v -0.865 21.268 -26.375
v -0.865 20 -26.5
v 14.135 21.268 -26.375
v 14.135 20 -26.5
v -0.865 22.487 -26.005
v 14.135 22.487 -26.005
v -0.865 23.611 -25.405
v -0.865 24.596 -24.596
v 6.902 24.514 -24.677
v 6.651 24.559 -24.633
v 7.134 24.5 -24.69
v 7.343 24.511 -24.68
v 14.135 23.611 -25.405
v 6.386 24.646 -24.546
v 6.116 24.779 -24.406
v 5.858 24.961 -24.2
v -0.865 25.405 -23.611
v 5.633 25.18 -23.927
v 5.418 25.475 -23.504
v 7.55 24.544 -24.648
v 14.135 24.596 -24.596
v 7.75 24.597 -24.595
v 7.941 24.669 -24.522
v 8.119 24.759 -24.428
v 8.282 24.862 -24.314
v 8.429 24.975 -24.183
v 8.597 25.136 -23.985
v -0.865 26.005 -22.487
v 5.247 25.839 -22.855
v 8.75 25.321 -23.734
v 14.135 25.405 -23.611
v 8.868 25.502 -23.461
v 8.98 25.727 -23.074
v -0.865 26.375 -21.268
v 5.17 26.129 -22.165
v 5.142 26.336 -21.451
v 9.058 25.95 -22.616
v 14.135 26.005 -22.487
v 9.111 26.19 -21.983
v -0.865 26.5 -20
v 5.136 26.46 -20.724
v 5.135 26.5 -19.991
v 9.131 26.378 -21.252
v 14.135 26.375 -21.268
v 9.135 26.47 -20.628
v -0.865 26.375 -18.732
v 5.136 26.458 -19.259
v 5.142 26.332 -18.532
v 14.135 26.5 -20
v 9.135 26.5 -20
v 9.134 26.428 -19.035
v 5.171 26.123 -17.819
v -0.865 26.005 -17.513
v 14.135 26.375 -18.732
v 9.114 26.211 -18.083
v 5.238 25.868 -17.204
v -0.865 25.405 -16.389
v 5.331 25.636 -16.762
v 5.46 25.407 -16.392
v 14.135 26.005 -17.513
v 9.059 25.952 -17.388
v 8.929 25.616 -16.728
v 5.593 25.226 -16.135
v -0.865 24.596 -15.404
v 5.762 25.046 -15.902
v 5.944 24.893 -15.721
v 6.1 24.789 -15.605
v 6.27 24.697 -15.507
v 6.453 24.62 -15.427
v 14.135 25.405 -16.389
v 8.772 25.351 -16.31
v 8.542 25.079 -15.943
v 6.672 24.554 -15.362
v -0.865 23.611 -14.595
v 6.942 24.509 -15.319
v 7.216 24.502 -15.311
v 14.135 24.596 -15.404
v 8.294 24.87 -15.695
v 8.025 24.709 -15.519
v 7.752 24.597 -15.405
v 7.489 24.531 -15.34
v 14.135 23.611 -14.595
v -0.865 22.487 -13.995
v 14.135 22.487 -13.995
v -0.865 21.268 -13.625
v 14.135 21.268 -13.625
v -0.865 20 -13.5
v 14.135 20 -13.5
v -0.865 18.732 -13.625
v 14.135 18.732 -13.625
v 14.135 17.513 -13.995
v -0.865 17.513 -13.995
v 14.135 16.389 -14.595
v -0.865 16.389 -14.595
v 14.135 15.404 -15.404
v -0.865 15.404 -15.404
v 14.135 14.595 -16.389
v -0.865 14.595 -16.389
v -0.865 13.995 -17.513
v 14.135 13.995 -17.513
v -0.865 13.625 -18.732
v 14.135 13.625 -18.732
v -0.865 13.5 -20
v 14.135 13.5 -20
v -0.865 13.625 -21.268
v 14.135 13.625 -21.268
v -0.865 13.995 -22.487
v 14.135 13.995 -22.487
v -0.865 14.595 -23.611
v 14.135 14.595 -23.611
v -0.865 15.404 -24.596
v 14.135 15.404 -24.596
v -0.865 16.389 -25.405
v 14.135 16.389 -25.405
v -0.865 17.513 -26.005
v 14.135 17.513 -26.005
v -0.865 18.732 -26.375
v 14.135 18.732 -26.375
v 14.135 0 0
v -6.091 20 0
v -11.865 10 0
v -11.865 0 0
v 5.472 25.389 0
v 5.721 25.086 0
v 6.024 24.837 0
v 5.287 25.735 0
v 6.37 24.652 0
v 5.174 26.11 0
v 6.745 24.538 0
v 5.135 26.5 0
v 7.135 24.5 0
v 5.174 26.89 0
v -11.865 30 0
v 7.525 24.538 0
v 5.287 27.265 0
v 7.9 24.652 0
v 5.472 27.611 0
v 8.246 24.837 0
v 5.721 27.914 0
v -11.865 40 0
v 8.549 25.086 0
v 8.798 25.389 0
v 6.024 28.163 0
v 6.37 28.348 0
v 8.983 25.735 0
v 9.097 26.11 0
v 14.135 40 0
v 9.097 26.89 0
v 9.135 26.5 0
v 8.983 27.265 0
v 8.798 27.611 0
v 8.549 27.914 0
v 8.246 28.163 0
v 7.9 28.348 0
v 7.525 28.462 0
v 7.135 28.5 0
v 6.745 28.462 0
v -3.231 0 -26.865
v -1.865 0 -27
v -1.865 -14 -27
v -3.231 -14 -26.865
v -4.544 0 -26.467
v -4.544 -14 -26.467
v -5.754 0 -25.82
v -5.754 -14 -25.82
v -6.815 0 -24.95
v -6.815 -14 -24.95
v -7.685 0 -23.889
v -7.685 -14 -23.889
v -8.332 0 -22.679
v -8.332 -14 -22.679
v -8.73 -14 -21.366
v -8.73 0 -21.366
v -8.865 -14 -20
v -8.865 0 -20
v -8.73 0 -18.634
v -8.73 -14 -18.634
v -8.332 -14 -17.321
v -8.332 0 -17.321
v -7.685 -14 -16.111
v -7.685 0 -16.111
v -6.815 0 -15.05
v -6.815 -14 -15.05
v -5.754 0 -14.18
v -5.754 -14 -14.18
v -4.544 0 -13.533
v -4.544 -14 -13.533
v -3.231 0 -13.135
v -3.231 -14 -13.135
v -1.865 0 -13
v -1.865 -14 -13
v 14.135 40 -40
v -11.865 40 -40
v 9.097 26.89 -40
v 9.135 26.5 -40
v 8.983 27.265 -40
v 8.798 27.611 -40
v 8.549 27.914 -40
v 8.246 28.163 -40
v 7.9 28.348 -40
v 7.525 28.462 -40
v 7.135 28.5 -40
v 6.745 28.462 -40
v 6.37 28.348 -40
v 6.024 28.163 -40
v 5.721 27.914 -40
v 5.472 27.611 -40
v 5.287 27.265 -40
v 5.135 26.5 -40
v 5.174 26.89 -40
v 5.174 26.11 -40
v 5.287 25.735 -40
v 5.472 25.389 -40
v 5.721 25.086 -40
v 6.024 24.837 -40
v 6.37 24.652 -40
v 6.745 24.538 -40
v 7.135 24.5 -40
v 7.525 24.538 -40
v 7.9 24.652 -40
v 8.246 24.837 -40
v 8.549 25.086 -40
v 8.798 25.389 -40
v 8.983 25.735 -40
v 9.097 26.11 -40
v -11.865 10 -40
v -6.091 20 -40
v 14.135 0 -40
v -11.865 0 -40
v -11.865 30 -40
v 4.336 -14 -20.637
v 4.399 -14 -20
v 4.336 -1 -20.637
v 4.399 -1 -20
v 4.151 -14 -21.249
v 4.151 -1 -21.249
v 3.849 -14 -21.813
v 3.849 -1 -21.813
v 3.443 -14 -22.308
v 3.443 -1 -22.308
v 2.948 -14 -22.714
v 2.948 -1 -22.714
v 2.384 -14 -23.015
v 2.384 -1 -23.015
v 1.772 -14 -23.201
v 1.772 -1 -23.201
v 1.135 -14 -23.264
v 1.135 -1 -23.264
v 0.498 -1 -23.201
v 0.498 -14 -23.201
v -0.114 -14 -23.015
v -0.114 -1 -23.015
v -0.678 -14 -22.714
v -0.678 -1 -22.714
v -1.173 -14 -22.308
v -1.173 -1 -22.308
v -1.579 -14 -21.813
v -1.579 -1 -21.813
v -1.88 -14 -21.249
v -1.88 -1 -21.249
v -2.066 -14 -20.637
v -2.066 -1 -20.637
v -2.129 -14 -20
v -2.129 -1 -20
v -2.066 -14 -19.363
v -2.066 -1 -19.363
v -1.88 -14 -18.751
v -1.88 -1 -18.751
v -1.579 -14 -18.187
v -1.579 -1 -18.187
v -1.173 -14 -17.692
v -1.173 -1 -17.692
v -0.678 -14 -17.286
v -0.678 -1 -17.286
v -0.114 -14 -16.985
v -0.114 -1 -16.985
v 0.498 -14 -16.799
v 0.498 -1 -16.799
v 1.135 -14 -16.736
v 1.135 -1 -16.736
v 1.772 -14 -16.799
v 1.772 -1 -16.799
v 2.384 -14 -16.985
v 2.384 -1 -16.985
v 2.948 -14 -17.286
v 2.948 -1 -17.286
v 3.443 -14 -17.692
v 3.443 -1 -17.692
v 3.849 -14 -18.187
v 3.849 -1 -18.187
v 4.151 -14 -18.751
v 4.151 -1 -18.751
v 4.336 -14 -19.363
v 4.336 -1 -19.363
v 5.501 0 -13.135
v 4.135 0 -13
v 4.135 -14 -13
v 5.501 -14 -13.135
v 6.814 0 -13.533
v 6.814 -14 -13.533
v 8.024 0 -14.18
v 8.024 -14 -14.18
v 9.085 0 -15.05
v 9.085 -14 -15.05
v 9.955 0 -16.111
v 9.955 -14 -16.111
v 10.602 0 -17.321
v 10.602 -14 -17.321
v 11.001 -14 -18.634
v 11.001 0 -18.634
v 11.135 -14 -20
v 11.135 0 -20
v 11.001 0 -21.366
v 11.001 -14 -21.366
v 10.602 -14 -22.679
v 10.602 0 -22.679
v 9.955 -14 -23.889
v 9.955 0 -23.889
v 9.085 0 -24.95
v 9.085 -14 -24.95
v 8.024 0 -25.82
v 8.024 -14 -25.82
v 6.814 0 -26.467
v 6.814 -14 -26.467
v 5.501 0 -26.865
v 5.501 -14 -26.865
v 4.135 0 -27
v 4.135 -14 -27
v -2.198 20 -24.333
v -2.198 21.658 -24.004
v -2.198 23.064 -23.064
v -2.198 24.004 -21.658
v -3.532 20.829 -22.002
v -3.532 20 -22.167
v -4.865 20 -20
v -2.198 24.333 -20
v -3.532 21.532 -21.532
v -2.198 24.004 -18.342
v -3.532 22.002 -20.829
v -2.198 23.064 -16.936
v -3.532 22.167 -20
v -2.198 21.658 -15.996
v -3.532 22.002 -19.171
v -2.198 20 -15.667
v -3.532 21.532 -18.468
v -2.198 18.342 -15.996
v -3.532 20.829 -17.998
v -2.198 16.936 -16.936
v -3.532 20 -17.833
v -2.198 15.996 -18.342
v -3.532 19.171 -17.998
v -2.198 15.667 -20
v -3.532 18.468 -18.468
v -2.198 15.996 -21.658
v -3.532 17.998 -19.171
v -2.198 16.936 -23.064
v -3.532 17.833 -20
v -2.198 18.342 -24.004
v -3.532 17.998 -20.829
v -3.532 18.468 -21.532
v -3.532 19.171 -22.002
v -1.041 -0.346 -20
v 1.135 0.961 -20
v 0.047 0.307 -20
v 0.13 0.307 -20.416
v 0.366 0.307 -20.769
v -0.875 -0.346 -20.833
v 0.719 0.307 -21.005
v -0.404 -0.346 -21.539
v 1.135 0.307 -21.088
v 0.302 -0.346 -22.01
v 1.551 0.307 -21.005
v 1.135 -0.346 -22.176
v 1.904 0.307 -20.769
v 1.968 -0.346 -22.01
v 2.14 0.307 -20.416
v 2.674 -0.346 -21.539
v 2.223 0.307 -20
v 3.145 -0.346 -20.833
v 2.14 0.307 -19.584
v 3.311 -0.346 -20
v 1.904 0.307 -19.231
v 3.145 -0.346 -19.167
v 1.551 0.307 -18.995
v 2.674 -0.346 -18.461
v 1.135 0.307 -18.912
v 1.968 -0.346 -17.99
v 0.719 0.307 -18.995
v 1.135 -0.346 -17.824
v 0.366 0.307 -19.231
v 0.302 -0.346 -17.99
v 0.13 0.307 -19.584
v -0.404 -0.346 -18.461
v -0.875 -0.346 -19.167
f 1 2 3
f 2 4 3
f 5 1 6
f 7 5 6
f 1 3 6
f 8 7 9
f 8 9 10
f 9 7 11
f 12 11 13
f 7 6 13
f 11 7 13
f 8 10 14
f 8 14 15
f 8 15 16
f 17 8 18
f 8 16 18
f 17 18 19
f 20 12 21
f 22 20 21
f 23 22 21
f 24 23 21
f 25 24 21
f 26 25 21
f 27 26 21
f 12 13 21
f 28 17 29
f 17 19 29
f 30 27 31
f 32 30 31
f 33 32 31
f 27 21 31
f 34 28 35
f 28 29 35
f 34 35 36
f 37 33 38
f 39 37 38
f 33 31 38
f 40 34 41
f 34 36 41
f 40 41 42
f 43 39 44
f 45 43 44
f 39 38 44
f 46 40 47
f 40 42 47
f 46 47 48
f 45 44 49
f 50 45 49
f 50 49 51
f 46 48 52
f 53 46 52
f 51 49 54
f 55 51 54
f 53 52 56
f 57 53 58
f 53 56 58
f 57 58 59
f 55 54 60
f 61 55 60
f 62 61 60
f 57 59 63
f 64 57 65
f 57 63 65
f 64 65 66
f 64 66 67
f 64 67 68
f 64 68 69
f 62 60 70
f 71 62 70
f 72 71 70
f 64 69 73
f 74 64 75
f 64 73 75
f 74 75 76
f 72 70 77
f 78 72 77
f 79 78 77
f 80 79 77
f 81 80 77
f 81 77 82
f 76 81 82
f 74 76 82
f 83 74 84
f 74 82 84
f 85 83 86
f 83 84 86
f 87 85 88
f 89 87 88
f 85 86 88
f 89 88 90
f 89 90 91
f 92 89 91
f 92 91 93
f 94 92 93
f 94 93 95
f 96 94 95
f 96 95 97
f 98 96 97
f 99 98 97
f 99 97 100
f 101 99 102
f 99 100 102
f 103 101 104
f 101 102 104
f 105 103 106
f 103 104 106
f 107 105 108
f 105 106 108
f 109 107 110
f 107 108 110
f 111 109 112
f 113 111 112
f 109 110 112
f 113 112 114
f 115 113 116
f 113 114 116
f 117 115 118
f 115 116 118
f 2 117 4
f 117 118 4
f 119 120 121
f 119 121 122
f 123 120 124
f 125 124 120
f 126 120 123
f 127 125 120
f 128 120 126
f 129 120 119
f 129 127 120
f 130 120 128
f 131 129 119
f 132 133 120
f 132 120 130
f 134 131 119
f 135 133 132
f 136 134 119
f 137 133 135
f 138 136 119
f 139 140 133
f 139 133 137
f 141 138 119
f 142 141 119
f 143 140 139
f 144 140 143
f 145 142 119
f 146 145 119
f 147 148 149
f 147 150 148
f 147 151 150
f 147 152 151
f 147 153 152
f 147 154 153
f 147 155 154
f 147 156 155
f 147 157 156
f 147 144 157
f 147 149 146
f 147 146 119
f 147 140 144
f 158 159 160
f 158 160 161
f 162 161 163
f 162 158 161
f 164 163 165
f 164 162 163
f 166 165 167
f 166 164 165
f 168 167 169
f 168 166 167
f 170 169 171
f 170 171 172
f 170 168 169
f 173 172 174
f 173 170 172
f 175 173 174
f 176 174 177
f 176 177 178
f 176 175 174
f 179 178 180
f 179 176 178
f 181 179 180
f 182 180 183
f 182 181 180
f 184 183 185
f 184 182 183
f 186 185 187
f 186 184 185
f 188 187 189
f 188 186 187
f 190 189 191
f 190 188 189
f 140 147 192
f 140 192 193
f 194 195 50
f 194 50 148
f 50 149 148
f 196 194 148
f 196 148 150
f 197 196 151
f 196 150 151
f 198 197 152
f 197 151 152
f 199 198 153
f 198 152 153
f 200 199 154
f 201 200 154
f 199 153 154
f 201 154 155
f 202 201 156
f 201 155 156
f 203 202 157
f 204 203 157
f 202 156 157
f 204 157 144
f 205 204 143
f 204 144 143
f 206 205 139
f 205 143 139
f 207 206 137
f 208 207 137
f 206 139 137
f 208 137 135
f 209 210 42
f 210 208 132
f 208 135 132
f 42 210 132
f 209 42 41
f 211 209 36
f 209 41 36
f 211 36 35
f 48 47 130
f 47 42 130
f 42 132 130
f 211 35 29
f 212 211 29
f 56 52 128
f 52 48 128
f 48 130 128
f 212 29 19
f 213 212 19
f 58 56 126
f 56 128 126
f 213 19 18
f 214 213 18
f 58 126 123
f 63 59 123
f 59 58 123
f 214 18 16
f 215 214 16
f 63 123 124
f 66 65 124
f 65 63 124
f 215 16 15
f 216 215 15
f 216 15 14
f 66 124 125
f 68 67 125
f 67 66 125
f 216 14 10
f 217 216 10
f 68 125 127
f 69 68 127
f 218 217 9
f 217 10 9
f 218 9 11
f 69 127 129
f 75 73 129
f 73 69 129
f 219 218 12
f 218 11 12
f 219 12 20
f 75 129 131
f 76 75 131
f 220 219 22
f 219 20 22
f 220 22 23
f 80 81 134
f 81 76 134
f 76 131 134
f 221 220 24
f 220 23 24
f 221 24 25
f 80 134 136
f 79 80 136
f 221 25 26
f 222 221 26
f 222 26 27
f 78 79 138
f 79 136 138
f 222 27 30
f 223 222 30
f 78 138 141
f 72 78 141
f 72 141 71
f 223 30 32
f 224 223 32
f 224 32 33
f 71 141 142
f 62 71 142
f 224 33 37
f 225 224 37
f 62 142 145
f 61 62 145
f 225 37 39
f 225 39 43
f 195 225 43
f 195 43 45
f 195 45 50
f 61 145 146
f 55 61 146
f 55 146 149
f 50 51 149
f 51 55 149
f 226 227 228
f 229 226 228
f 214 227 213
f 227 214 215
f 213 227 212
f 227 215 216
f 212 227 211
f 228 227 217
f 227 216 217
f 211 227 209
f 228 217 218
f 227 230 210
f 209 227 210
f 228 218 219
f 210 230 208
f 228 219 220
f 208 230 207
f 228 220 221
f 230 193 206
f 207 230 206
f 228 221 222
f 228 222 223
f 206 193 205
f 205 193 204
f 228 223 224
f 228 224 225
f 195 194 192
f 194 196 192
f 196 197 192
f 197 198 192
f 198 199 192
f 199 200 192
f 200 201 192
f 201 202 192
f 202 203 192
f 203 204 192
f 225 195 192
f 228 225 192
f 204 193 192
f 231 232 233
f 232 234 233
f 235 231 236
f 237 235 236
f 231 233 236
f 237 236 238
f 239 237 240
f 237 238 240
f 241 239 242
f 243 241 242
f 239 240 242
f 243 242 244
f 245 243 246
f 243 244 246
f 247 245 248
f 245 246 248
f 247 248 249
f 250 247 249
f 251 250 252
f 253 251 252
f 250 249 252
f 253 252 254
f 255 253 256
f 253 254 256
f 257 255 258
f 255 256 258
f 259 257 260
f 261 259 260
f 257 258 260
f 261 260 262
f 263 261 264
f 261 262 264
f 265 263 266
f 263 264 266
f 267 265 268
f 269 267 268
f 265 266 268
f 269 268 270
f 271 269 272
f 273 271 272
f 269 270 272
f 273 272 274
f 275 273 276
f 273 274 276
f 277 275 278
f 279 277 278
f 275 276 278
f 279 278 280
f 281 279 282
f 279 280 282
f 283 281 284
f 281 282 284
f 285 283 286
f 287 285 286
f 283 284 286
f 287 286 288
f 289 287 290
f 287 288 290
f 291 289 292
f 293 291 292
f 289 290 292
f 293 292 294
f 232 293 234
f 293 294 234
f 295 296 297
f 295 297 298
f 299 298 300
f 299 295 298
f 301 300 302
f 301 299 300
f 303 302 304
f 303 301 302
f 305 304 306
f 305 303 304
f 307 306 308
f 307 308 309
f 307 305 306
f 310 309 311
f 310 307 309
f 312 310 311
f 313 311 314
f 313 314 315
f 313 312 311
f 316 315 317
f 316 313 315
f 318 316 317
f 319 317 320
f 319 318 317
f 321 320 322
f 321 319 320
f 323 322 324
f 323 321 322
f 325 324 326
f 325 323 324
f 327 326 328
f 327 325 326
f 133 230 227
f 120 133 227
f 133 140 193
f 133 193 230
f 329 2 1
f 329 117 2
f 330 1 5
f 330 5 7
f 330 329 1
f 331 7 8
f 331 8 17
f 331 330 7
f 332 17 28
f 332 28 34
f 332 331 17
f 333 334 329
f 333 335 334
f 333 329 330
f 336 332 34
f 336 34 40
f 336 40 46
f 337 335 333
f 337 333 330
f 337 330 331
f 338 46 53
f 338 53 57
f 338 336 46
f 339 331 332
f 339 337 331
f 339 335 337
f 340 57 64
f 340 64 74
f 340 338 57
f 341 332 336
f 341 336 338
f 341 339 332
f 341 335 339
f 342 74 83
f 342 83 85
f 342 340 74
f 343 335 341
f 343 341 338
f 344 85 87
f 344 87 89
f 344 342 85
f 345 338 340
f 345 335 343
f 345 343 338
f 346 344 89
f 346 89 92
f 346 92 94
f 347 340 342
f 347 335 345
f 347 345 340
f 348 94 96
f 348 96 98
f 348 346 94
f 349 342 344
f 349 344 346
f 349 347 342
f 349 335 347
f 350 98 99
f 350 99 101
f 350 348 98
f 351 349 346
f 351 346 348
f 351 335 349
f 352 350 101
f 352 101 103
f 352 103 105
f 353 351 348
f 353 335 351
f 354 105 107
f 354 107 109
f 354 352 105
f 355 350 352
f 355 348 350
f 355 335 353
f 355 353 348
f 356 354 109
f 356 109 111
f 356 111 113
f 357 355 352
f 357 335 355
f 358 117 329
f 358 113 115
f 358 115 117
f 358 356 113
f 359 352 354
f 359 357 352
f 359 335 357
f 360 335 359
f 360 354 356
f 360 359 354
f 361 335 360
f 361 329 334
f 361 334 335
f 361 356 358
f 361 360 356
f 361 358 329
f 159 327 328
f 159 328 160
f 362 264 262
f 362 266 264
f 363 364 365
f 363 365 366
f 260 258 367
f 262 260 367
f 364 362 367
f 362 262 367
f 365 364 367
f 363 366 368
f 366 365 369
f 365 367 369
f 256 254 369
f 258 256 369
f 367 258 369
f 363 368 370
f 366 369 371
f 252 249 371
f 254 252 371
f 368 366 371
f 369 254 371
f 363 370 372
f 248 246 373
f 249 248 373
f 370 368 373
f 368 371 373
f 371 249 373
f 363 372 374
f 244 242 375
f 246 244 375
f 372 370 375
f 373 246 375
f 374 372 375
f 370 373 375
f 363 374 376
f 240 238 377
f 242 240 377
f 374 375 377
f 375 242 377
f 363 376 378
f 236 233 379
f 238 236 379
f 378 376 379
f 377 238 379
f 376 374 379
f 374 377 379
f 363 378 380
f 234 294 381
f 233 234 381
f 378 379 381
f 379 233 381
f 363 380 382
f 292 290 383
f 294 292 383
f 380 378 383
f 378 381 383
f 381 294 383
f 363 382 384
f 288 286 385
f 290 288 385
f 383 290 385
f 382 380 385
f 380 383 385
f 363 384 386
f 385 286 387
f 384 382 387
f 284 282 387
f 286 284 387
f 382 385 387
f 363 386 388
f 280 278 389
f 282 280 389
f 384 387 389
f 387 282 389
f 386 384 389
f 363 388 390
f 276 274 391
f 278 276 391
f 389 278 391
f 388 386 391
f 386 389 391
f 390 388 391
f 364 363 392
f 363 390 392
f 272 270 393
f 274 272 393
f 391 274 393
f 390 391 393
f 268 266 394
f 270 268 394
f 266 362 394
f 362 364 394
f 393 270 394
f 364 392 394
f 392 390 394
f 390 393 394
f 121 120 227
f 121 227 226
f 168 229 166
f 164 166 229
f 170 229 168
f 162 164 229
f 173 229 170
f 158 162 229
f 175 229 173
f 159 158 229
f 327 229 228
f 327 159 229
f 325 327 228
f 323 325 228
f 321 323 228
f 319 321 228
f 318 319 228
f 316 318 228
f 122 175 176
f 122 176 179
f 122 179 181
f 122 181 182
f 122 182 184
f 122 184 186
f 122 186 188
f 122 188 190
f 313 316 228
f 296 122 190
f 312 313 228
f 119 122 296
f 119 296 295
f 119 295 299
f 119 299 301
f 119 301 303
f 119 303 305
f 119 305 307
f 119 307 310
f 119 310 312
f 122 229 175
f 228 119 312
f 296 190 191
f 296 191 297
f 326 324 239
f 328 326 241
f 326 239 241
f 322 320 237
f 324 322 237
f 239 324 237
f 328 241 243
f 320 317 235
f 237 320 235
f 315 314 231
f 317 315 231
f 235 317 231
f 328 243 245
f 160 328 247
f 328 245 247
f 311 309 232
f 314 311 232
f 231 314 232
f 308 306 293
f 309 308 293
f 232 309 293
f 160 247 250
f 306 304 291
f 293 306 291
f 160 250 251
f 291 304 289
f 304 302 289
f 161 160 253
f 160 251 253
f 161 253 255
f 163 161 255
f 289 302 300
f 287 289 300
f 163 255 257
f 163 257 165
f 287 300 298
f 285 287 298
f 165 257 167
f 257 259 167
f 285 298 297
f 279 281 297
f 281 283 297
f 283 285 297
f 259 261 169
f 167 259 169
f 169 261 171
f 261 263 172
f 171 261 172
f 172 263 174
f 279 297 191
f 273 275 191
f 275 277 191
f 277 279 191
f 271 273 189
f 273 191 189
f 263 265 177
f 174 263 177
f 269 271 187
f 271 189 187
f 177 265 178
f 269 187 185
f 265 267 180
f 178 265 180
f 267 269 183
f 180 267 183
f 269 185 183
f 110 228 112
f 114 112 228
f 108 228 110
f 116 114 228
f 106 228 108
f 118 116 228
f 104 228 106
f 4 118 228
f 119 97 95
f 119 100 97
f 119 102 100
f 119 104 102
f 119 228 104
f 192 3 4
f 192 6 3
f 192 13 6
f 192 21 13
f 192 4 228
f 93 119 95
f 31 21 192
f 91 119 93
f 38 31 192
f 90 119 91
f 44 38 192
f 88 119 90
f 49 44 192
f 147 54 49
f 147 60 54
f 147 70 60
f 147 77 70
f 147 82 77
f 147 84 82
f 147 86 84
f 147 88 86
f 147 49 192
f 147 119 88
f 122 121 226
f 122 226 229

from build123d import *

# Parameters (mm, degrees)
RESSALTO_EXTRUS_O1_DEPTH                       = 40
ESBO_O2_R                                      = 6.5
CORTE_EXTRUS_O1_DEPTH                          = 19
CHANFRO1_SIZE2                                 = 6.5
CHANFRO1_SIZE                                  = 4
ESBO_O3_R                                      = 2
CORTE_EXTRUS_O2_DEPTH                          = 59.307816613
RESSALTO_EXTRUS_O2_DEPTH                       = 14
BROCA_DE_ROSQUEAR_PARA_TARRAXA_DE_5_16_1_D     = 6.5278
BROCA_DE_ROSQUEAR_PARA_TARRAXA_DE_5_16_1_DEPTH = 13
BROCA_DE_ROSQUEAR_PARA_TARRAXA_DE_5_16_1_TIP   = 1.961148974


with BuildPart() as part:
    # Esboço1 → Ressalto-extrusão1 (new body)
    with BuildSketch(Plane.XY):
        Polygon((-11.864884923, 0), (14.135115077, 0), (14.135115077, 40), (-11.864884923, 40), (-11.864884923, 30), (-6.091382231, 20), (-11.864884923, 10), align=None)
    extrude(amount=-RESSALTO_EXTRUS_O1_DEPTH)

    # Esboço2 → Corte-extrusão1 (cut)
    with BuildSketch(Plane(origin=(14.135115077, 0, 0), x_dir=(0, 0, -1), z_dir=(1, 0, 0))):
        with Locations((20, 20)):
            Circle(ESBO_O2_R)
    extrude(amount=-CORTE_EXTRUS_O1_DEPTH, mode=Mode.SUBTRACT)

    # Chanfro1
    chanfro1_edges = [part.edges().sort_by_distance(p)[0] for p in [
        (-4.864884923, 20, -13.5),
    ]]
    chanfro1_side = [part.faces().sort_by_distance(p)[0] for p in [
        (-4.784884923, 20, -13.5),
    ]]
    chamfer(chanfro1_edges, length=CHANFRO1_SIZE - 0.0001, length2=CHANFRO1_SIZE2 - 0.0001, reference=chanfro1_side[0])  # a hair under: the kernel refuses the full size

    # Esboço3 → Corte-extrusão2 (cut, through all)
    with BuildSketch(Plane.XY):
        with Locations((7.135115077, 26.5)):
            Circle(ESBO_O3_R)
    extrude(amount=-CORTE_EXTRUS_O2_DEPTH, mode=Mode.SUBTRACT)

    # Esboço4 → Ressalto-extrusão2 (add)
    with BuildSketch(Plane.XZ):
        with BuildLine():
            Line((-1.864884923, -13), (4.135115077, -13))
            ThreePointArc((4.135115077, -13), (11.135115077, -20), (4.135115077, -27))
            Line((4.135115077, -27), (-1.864884923, -27))
            ThreePointArc((-1.864884923, -27), (-8.864884923, -20), (-1.864884923, -13))
        make_face()
    extrude(amount=RESSALTO_EXTRUS_O2_DEPTH)

    # Broca de rosquear para tarraxa de 5/16-181
    with Locations(Plane(origin=(0, -14, 0), x_dir=(-1, 0, 0), z_dir=(0, -1, 0))):
        with Locations((-1.135115077, 20)):
            Hole(BROCA_DE_ROSQUEAR_PARA_TARRAXA_DE_5_16_1_D / 2, depth=BROCA_DE_ROSQUEAR_PARA_TARRAXA_DE_5_16_1_DEPTH)
            with Locations((0, 0, -(BROCA_DE_ROSQUEAR_PARA_TARRAXA_DE_5_16_1_DEPTH + BROCA_DE_ROSQUEAR_PARA_TARRAXA_DE_5_16_1_TIP / 2))):  # 118° drill point
                Cone(0, BROCA_DE_ROSQUEAR_PARA_TARRAXA_DE_5_16_1_D / 2, BROCA_DE_ROSQUEAR_PARA_TARRAXA_DE_5_16_1_TIP, mode=Mode.SUBTRACT)


solid = part.part
